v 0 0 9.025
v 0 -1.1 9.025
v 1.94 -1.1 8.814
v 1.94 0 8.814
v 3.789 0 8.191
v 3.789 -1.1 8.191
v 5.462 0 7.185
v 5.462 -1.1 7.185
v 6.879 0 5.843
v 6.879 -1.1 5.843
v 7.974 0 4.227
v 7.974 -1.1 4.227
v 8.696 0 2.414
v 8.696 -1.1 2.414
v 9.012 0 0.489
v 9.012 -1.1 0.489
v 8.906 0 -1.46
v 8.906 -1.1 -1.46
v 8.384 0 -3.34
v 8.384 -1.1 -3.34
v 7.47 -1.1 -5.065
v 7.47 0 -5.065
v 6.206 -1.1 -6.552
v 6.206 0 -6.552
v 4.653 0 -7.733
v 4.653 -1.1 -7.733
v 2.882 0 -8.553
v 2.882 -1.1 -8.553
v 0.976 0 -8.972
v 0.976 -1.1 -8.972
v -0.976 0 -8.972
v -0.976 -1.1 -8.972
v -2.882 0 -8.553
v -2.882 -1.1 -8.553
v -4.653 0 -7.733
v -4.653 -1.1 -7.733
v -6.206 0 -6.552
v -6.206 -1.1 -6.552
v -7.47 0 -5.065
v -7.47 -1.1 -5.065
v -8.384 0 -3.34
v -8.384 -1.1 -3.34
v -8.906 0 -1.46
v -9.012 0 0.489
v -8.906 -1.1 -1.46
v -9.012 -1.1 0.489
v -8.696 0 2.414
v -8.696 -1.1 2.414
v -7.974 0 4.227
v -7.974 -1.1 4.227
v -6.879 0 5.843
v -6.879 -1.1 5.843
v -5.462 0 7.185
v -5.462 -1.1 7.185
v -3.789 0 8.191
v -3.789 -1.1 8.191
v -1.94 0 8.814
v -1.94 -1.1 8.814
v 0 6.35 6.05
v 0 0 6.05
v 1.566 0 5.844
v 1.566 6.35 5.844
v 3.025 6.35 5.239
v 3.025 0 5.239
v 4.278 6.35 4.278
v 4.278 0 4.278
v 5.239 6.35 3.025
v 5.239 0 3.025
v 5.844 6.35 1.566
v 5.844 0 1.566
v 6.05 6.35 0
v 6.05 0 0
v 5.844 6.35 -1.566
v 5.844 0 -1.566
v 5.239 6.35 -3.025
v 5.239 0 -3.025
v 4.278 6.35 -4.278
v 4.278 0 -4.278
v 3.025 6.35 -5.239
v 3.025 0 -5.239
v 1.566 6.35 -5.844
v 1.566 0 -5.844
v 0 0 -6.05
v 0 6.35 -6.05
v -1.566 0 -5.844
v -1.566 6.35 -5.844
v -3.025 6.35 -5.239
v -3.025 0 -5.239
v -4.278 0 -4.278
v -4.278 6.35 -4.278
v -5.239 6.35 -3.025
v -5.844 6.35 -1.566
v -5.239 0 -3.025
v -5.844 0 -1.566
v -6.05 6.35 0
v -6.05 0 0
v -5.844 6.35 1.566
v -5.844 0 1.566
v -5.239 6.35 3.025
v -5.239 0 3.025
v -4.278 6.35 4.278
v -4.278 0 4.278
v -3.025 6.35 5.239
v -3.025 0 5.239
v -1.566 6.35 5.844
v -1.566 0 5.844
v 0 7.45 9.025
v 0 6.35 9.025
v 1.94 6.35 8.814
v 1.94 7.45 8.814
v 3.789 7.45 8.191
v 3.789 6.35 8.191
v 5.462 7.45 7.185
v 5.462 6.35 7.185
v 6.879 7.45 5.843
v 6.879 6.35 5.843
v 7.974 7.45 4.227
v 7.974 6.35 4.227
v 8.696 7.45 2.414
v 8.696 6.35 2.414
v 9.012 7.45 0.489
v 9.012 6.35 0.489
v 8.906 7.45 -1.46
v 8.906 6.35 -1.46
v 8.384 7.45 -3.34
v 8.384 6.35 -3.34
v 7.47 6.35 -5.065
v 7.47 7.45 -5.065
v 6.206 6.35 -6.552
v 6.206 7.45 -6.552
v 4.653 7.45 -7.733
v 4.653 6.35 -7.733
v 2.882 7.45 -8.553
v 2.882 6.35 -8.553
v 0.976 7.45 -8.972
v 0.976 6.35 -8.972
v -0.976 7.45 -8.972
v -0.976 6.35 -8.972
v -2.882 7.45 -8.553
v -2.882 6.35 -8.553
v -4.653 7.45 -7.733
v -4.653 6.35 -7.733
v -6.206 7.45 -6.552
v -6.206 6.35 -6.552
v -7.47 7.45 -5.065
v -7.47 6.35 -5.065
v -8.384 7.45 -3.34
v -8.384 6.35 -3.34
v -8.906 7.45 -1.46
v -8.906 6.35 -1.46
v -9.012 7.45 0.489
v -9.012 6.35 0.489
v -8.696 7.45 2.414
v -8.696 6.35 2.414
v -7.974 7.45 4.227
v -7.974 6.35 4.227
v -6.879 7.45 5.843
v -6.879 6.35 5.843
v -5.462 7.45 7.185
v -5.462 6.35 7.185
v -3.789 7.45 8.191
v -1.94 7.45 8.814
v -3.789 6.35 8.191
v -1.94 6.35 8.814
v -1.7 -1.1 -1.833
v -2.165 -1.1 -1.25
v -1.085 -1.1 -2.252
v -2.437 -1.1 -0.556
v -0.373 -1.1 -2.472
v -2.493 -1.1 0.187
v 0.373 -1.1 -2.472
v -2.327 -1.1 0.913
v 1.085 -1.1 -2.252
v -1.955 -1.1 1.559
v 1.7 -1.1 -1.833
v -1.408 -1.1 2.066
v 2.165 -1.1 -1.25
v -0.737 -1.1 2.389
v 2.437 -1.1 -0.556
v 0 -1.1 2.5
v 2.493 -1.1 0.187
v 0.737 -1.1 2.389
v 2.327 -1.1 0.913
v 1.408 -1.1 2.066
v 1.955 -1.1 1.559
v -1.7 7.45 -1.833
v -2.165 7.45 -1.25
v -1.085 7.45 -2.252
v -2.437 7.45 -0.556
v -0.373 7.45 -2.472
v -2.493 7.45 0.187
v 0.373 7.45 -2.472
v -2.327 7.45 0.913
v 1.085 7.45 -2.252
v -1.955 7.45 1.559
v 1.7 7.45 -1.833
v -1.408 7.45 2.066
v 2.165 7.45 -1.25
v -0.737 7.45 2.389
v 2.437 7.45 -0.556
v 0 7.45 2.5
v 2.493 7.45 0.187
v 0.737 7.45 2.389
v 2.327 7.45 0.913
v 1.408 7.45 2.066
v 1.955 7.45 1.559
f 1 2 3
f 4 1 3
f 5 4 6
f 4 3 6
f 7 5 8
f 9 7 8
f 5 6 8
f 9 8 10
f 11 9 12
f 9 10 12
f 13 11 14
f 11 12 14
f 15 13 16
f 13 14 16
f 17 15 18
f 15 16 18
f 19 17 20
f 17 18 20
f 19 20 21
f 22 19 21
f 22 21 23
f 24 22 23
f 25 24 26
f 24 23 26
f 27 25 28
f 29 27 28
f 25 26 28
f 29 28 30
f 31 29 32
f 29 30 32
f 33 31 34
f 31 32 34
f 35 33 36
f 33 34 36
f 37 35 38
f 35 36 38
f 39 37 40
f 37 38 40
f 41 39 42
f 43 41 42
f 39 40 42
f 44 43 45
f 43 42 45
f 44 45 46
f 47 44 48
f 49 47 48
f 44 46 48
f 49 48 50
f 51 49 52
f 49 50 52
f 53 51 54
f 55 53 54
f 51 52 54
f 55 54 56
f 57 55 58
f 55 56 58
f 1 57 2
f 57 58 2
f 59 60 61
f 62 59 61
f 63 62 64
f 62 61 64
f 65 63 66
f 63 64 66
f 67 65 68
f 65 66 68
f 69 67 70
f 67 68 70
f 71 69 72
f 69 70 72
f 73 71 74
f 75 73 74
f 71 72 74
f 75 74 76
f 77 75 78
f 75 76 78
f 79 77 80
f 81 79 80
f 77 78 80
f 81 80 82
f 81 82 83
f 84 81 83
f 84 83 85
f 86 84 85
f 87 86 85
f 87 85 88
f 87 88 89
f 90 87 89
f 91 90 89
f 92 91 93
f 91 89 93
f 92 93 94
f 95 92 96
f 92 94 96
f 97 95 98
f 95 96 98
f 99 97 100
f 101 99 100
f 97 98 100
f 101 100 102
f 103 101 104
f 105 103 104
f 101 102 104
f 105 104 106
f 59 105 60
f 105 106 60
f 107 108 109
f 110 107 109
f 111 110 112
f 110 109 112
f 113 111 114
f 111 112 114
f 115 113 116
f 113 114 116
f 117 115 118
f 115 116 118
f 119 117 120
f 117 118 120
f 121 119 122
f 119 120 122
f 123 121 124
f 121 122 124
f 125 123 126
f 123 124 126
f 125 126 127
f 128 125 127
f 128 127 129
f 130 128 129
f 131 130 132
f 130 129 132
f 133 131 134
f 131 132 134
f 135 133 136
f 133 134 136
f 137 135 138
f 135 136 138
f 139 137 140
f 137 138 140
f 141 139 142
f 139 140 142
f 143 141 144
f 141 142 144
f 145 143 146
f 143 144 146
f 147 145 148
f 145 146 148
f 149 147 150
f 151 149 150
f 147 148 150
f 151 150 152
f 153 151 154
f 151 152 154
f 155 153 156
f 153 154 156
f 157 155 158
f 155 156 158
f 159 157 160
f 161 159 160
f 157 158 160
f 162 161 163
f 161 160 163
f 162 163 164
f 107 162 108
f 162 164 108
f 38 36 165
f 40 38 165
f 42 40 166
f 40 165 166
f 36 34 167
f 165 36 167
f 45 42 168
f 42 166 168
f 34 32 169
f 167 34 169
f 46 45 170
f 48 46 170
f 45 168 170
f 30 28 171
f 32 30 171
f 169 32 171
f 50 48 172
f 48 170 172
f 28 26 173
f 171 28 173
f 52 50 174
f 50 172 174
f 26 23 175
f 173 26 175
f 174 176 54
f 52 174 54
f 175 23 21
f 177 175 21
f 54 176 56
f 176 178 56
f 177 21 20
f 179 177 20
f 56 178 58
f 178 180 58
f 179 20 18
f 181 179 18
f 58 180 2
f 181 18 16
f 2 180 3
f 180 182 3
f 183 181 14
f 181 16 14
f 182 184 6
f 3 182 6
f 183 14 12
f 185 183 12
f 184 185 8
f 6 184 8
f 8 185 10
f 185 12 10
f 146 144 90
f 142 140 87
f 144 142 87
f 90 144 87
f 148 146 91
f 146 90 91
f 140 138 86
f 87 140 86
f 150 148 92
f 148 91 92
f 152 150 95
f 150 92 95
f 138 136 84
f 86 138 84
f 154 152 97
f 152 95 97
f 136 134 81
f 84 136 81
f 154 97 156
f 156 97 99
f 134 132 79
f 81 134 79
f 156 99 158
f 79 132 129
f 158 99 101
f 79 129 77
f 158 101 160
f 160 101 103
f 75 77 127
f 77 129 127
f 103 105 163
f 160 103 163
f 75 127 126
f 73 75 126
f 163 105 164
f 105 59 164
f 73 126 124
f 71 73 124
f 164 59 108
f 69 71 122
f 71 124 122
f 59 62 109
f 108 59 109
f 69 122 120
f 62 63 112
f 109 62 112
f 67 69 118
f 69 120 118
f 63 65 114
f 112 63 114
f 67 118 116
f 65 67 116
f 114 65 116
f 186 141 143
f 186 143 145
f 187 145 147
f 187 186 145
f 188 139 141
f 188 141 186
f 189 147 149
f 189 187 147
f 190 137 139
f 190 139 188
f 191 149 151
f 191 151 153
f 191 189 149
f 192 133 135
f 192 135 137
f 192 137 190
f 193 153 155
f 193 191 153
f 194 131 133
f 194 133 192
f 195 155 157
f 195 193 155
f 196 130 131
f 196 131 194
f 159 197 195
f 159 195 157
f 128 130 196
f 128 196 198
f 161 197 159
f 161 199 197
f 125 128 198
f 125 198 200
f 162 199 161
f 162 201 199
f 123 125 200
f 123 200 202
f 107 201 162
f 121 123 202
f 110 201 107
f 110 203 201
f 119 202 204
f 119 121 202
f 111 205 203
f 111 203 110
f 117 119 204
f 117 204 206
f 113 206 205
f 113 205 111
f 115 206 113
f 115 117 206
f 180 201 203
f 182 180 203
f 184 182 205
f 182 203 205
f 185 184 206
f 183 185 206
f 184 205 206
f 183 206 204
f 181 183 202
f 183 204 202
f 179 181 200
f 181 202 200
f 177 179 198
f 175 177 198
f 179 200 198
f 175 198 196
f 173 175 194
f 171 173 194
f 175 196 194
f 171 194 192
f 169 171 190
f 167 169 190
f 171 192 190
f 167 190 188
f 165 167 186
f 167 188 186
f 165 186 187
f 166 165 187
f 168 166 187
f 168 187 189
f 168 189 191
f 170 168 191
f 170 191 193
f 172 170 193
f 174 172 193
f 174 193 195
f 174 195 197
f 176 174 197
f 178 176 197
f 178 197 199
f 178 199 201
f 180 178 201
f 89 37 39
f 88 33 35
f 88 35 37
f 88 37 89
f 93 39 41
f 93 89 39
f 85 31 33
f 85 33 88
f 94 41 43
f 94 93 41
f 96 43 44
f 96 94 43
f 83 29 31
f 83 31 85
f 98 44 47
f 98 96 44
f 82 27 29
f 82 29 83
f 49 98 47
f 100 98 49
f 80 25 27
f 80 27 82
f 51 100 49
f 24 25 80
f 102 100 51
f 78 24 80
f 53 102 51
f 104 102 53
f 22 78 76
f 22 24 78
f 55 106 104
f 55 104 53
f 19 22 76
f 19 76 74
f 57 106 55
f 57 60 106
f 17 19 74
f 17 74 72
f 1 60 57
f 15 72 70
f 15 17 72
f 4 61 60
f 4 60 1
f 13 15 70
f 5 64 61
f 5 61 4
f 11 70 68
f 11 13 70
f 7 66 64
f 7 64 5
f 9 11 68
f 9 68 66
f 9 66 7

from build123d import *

# Parameters (mm, degrees)
SKETCH1_R           = 6.05
BOSS_EXTRUDE1_DEPTH = 6.35
SKETCH1_3_R         = 9.025
BOSS_EXTRUDE2_DEPTH = 1.1
BOSS_EXTRUDE3_START = 7.45
SKETCH1_4_R         = 9.025
BOSS_EXTRUDE3_DEPTH = 1.1
CUT_EXTRUDE1_REACH  = 17.362
SKETCH2_R           = 2.5


with BuildPart() as part:
    # Sketch1 → Boss-Extrude1 (new body)
    with BuildSketch(Plane(origin=(0, 0, 0), x_dir=(1, 0, 0), z_dir=(0, 1, 0))):
        Circle(SKETCH1_R)
    extrude(amount=BOSS_EXTRUDE1_DEPTH)

    # Sketch1<3> → Boss-Extrude2 (add)
    with BuildSketch(Plane(origin=(0, 0, 0), x_dir=(1, 0, 0), z_dir=(0, 1, 0))):
        Circle(SKETCH1_3_R)
    extrude(amount=-BOSS_EXTRUDE2_DEPTH)

    # Sketch1<4> → Boss-Extrude3 (add)
    with BuildSketch(Plane(origin=(0, 0, 0), x_dir=(1, 0, 0), z_dir=(0, 1, 0)).offset(BOSS_EXTRUDE3_START)):
        Circle(SKETCH1_4_R)
    extrude(amount=-BOSS_EXTRUDE3_DEPTH)

    # Sketch2 → Cut-Extrude1 (cut, up to next)
    with BuildSketch(Plane(origin=(0, 7.45, 0), x_dir=(1, 0, 0), z_dir=(0, 1, 0)), mode=Mode.PRIVATE) as cut_extrude1_sk1:
        Circle(SKETCH2_R)
    cut_extrude1_tool1 = extrude(cut_extrude1_sk1.sketch, amount=-CUT_EXTRUDE1_REACH, mode=Mode.PRIVATE) & part.part
    add(cut_extrude1_tool1.solids().sort_by_distance((0, 7.45, 0))[0], mode=Mode.SUBTRACT)


solid = part.part
